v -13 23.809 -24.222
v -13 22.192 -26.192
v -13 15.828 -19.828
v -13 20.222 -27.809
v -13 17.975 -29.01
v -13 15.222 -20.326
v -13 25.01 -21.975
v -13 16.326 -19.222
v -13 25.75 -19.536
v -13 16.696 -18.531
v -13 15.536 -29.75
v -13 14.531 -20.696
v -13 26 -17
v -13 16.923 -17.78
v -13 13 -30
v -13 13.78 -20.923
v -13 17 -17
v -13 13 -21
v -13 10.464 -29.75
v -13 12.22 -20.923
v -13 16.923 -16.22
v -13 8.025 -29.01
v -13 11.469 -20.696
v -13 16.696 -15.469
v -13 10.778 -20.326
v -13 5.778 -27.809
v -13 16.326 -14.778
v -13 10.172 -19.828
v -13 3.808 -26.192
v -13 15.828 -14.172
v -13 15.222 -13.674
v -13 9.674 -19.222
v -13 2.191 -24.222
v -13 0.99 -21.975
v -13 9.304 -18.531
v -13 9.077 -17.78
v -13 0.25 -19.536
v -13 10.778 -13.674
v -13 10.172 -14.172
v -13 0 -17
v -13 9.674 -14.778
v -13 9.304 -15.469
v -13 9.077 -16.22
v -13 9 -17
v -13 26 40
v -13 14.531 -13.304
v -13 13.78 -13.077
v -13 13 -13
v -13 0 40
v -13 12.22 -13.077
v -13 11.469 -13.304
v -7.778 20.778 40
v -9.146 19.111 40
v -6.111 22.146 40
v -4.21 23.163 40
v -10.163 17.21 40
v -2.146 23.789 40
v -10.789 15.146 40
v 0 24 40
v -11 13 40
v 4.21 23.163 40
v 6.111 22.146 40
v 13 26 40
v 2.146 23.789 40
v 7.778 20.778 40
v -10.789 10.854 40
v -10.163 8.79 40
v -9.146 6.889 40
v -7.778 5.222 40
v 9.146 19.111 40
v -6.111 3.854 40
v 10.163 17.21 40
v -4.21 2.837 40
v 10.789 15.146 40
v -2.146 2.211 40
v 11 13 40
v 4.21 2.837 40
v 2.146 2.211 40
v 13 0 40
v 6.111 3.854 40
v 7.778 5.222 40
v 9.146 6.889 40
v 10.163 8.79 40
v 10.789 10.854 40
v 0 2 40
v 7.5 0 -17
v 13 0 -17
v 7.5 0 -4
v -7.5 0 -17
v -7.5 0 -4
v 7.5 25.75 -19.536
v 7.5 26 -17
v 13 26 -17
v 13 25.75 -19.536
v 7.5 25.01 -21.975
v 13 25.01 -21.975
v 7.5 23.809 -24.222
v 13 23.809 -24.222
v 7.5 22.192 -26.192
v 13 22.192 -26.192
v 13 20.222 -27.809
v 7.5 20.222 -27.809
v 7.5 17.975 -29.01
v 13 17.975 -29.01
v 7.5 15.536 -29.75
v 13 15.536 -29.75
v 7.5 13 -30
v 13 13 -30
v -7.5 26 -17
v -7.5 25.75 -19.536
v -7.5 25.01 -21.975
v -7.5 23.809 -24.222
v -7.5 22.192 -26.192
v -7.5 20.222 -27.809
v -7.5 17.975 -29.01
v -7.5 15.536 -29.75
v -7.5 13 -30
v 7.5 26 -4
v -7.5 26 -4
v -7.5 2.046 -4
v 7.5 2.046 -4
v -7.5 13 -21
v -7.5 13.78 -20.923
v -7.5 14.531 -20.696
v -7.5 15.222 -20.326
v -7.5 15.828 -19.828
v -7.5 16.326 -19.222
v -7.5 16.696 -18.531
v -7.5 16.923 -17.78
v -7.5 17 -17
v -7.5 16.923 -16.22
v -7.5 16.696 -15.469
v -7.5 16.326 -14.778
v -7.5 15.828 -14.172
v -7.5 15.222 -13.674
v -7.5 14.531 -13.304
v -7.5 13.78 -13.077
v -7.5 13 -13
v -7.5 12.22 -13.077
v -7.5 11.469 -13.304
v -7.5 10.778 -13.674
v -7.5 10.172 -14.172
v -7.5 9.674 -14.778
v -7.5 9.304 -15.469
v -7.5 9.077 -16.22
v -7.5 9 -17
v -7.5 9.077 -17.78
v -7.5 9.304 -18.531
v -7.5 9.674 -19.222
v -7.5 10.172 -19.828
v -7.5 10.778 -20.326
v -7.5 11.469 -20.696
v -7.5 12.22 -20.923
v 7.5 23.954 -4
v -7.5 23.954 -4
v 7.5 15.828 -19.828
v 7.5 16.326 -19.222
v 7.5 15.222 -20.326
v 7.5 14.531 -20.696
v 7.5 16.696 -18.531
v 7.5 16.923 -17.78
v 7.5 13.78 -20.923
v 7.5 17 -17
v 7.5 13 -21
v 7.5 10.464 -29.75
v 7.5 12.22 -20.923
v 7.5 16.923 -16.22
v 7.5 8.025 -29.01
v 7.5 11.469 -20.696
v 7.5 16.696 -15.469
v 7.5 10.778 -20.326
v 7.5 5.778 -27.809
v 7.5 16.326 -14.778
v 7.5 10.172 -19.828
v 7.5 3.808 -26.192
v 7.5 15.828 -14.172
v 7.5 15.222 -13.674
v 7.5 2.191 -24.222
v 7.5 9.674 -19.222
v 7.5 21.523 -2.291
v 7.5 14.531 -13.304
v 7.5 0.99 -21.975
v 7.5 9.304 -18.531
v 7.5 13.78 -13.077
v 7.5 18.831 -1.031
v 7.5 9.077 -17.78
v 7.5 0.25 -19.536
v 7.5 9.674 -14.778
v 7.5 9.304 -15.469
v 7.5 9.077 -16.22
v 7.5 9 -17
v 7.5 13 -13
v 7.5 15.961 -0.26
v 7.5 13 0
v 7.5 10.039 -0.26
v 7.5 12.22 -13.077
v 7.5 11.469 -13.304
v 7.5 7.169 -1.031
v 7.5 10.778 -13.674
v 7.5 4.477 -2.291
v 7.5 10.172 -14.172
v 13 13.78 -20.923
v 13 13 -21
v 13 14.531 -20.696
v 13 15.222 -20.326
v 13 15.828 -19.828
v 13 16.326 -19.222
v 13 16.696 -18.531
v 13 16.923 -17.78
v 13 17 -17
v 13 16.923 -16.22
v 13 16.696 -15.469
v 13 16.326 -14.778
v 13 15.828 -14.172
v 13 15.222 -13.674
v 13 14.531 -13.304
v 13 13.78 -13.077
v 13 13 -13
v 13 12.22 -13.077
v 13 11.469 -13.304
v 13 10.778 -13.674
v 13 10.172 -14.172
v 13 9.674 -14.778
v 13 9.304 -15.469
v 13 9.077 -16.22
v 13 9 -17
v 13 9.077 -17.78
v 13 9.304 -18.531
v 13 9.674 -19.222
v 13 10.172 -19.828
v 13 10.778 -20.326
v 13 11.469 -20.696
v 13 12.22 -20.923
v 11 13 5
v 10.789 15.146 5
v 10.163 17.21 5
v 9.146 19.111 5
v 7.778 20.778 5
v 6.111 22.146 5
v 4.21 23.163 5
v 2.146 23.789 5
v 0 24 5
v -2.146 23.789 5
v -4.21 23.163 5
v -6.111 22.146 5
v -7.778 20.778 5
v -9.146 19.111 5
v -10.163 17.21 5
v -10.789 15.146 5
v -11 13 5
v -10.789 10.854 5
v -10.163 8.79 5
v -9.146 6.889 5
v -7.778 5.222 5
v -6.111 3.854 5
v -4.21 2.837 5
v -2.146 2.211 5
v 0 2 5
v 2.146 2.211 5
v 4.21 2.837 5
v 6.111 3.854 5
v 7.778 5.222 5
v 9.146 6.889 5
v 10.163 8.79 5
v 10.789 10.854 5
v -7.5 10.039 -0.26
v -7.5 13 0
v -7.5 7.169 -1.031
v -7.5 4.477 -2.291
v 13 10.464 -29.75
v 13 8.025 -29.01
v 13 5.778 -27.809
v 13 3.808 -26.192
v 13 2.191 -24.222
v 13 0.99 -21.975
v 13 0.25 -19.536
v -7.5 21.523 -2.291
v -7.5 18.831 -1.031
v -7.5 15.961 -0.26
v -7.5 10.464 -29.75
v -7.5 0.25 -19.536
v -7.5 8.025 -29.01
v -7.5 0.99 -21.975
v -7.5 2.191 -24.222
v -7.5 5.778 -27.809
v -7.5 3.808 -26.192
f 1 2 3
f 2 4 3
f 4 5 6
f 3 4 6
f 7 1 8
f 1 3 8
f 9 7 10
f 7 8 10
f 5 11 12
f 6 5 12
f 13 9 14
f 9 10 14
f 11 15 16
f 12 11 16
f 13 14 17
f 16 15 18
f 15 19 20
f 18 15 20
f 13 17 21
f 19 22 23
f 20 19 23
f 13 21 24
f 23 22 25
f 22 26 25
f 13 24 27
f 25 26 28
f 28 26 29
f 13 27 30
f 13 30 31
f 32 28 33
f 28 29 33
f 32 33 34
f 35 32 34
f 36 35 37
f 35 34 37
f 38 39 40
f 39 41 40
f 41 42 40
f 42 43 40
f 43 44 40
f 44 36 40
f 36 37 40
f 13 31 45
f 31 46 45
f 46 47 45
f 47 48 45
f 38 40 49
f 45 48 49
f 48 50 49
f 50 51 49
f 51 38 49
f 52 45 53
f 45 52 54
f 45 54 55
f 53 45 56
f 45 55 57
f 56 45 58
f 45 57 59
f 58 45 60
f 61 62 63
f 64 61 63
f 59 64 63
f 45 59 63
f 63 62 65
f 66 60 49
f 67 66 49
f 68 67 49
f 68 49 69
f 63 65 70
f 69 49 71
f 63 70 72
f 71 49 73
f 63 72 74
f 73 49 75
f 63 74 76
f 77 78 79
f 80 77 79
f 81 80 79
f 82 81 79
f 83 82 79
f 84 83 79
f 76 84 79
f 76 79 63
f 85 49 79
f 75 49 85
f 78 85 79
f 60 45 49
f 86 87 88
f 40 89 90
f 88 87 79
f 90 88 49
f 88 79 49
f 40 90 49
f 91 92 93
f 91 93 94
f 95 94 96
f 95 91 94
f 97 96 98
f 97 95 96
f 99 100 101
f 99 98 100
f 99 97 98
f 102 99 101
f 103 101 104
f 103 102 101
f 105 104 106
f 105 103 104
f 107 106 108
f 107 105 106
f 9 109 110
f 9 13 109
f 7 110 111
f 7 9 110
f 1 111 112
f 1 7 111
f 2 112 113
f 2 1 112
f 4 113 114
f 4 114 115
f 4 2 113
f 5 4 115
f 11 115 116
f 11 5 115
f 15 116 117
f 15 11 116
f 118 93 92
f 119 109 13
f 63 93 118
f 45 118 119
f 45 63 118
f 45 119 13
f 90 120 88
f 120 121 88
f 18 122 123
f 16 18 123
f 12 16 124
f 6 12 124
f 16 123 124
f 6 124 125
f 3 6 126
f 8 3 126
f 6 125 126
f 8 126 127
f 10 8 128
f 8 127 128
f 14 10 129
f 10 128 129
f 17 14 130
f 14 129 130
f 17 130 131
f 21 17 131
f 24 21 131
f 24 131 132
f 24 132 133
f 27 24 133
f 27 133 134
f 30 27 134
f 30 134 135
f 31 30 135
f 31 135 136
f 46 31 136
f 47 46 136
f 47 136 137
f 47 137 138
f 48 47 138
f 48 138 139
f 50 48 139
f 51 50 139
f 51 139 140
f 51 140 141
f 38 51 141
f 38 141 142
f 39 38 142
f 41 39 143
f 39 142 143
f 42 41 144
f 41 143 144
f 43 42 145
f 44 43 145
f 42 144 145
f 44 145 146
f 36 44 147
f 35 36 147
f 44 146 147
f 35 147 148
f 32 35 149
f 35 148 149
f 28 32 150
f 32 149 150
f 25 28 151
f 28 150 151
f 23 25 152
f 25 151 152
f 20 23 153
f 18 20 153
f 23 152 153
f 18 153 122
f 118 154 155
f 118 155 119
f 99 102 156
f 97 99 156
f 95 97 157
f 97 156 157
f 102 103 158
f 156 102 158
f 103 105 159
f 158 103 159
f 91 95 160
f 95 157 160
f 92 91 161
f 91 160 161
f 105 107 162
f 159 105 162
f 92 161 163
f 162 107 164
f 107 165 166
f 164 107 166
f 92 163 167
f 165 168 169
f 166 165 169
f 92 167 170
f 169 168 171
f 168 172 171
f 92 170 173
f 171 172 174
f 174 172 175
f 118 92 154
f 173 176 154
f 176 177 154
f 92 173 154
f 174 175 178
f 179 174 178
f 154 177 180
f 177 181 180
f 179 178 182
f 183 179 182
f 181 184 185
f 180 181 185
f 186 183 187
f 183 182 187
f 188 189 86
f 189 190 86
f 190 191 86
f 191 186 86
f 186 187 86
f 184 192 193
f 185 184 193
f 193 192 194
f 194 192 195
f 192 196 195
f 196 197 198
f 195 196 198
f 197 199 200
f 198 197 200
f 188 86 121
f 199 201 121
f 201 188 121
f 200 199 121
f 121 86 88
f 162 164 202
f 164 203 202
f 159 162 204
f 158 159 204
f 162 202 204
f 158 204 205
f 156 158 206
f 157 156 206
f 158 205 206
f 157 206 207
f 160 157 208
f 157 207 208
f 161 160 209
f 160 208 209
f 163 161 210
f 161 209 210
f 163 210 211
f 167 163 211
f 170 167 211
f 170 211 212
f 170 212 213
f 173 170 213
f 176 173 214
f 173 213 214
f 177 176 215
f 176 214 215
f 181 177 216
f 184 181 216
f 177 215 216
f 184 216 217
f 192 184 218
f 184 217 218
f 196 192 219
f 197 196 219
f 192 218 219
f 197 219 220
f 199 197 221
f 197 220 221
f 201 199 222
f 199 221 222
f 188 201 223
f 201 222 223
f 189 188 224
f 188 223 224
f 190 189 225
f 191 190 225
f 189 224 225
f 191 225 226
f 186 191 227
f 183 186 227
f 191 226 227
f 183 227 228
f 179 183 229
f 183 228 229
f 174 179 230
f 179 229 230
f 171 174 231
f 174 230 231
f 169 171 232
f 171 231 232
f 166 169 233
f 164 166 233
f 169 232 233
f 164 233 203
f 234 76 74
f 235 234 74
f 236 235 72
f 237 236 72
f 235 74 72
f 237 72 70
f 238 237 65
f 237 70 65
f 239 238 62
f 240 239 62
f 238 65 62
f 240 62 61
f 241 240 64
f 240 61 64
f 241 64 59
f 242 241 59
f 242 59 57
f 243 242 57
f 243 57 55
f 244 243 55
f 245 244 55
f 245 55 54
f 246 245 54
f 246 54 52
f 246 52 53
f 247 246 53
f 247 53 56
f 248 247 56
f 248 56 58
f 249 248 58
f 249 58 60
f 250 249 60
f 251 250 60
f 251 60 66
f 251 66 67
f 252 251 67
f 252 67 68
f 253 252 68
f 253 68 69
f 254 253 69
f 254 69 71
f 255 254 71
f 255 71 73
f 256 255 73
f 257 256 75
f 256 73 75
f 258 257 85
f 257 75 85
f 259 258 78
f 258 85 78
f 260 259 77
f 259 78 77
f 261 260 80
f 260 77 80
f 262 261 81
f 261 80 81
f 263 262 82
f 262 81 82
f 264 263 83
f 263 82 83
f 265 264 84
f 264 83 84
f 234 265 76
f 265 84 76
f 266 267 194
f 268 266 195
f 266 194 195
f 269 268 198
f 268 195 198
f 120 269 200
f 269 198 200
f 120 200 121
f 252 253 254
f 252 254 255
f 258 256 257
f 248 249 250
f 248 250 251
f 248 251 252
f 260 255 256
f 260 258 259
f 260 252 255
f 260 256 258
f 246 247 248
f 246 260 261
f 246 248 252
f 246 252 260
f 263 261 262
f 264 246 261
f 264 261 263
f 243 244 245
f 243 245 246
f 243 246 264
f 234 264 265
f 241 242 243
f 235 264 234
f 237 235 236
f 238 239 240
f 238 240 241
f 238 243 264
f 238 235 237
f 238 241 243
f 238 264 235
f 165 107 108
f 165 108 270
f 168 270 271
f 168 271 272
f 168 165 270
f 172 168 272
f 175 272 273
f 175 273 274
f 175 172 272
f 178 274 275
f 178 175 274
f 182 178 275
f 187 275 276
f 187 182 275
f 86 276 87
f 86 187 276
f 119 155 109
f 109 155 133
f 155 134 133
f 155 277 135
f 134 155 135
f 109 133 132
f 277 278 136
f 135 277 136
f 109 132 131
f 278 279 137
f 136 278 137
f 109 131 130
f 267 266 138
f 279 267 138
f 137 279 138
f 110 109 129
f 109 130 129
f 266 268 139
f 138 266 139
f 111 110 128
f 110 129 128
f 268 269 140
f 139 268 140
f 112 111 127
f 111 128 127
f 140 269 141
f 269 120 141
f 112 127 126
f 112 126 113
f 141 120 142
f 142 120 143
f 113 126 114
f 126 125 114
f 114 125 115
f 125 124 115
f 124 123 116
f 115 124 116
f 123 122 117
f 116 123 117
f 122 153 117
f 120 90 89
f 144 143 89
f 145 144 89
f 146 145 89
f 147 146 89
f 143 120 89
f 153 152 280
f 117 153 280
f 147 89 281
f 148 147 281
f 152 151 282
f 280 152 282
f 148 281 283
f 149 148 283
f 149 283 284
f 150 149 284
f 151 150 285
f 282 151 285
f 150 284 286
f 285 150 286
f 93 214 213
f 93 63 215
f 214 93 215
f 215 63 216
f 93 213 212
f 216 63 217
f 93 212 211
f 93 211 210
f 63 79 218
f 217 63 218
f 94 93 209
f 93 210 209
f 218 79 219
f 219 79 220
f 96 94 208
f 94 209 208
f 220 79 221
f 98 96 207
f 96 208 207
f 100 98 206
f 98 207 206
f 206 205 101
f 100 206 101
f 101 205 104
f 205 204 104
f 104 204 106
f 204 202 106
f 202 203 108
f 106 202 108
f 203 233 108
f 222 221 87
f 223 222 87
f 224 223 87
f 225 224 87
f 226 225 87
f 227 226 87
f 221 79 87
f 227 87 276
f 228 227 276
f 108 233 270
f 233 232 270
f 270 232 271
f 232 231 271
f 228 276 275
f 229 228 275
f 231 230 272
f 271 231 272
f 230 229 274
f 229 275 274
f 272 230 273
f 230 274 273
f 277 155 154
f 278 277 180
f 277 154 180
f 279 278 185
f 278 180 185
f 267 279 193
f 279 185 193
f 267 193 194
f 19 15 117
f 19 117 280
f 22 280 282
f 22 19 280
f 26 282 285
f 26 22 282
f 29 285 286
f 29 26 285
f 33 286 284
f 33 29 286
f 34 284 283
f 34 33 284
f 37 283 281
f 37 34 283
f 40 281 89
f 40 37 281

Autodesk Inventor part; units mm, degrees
ref_plane "YZ Plane" through (0, 0, 0) normal (1, 0, 0) x (0, 1, 0)
ref_plane "XZ Plane" through (0, 0, 0) normal (0, 1, 0) x (-1, 0, 0)
ref_plane "XY Plane" through (0, 0, 0) normal (0, 0, 1) x (1, 0, 0)
sketch "Sketch1" plane through (0, 0, 0) normal (0, 1, 0) x (-1, 0, 0)
  line L0 (-7.5, 0) -> (7.5, 0)
  line L1 (7.5, 0) -> (7.5, -30)
  line L2 (7.5, -30) -> (13, -30)
  line L3 (13, -30) -> (13, 40)
  line L4 (13, 40) -> (-13, 40)
  line L5 (-13, 40) -> (-13, -30)
  line L6 (-13, -30) -> (-7.5, -30)
  line L7 (-7.5, -30) -> (-7.5, 0)
  line L8 (0, 0) -> (0, 40) construction
  line L9 (-11, 8) -> (11, 8) construction
  point P0 (0, 8)
  dimension "d0" = 22
  dimension "d1" = 30
  dimension "d2" = 15
  dimension "d3" = 8
  dimension "d8" = 26
  dimension "d9" = 40
extrude "Extrusion1" add sketch "Sketch1" along normal blind 26
sketch "Sketch2" plane through (13, 0, 40) normal (1, 0, 0) x (0, 0, -1)
  line L0 (70, 0) -> (70, 26) projected
  circle A0 centre (57, 13) radius 4
  point P0 (40, 0)
  point P1 (70, 13)
  dimension "d10" = 8
  dimension "d11" = 13
extrude "Extrusion2" cut sketch "Sketch2" against normal up to surface (26 mm away)
fillet "Fillet1" radius 13 4 edges at (-10.25, 26, -30) (10.25, 26, -30) (-10.25, 0, -30) (10.25, 0, -30)
sketch "Sketch3" plane through (-13, 0, 40) normal (0, 0, 1) x (1, 0, 0)
  line L0 (0, 0) -> (26, 0) projected
  line L1 (26, 0) -> (26, 26) projected
  circle A0 centre (13, 13) radius 11
  point P0 (13, 0)
  point P1 (26, 13)
  point P2 (13, 0)
  dimension "d15" = 22
extrude "Extrusion3" cut sketch "Sketch3" against normal blind 35
sketch "Sketch4" plane through (7.5, 0, 0) normal (-1, 0, 0) x (0, 0, 1)
  arc A0 (-17, 26) -> (-17, 0) centre (-17, 13) ccw projected
  line L0 (-17, 0) -> (0, 0) projected
  line L1 (0, 0) -> (0, 26) projected
  line L2 (-17, 26) -> (0, 26) projected
  arc A1 (0, 13) -> (-6.0455, 26) centre (-17, 13) ccw
  arc A2 (-6.1134, -0.0569) -> (0, 13) centre (-17, 13) ccw
  line L3 (-6.0455, 0) -> (0, 0)
  line L4 (0, 26) -> (-6.0455, 26)
  circle A3 centre (-17, 13) radius 4 projected
  circle A4 centre (-17, 13) radius 13 construction
  line L5 (-4, 23.9545) -> (-4, 2.0455) construction
  line L6 (-4, 23.9545) -> (-4, 26)
  line L7 (-4, 2.0455) -> (-4, 0)
extrude "Extrusion5" add sketch "Sketch4" along normal up to next contours L2 L1 A1 L6 | L7 A2 L1 L0
properties part number "spoke"
